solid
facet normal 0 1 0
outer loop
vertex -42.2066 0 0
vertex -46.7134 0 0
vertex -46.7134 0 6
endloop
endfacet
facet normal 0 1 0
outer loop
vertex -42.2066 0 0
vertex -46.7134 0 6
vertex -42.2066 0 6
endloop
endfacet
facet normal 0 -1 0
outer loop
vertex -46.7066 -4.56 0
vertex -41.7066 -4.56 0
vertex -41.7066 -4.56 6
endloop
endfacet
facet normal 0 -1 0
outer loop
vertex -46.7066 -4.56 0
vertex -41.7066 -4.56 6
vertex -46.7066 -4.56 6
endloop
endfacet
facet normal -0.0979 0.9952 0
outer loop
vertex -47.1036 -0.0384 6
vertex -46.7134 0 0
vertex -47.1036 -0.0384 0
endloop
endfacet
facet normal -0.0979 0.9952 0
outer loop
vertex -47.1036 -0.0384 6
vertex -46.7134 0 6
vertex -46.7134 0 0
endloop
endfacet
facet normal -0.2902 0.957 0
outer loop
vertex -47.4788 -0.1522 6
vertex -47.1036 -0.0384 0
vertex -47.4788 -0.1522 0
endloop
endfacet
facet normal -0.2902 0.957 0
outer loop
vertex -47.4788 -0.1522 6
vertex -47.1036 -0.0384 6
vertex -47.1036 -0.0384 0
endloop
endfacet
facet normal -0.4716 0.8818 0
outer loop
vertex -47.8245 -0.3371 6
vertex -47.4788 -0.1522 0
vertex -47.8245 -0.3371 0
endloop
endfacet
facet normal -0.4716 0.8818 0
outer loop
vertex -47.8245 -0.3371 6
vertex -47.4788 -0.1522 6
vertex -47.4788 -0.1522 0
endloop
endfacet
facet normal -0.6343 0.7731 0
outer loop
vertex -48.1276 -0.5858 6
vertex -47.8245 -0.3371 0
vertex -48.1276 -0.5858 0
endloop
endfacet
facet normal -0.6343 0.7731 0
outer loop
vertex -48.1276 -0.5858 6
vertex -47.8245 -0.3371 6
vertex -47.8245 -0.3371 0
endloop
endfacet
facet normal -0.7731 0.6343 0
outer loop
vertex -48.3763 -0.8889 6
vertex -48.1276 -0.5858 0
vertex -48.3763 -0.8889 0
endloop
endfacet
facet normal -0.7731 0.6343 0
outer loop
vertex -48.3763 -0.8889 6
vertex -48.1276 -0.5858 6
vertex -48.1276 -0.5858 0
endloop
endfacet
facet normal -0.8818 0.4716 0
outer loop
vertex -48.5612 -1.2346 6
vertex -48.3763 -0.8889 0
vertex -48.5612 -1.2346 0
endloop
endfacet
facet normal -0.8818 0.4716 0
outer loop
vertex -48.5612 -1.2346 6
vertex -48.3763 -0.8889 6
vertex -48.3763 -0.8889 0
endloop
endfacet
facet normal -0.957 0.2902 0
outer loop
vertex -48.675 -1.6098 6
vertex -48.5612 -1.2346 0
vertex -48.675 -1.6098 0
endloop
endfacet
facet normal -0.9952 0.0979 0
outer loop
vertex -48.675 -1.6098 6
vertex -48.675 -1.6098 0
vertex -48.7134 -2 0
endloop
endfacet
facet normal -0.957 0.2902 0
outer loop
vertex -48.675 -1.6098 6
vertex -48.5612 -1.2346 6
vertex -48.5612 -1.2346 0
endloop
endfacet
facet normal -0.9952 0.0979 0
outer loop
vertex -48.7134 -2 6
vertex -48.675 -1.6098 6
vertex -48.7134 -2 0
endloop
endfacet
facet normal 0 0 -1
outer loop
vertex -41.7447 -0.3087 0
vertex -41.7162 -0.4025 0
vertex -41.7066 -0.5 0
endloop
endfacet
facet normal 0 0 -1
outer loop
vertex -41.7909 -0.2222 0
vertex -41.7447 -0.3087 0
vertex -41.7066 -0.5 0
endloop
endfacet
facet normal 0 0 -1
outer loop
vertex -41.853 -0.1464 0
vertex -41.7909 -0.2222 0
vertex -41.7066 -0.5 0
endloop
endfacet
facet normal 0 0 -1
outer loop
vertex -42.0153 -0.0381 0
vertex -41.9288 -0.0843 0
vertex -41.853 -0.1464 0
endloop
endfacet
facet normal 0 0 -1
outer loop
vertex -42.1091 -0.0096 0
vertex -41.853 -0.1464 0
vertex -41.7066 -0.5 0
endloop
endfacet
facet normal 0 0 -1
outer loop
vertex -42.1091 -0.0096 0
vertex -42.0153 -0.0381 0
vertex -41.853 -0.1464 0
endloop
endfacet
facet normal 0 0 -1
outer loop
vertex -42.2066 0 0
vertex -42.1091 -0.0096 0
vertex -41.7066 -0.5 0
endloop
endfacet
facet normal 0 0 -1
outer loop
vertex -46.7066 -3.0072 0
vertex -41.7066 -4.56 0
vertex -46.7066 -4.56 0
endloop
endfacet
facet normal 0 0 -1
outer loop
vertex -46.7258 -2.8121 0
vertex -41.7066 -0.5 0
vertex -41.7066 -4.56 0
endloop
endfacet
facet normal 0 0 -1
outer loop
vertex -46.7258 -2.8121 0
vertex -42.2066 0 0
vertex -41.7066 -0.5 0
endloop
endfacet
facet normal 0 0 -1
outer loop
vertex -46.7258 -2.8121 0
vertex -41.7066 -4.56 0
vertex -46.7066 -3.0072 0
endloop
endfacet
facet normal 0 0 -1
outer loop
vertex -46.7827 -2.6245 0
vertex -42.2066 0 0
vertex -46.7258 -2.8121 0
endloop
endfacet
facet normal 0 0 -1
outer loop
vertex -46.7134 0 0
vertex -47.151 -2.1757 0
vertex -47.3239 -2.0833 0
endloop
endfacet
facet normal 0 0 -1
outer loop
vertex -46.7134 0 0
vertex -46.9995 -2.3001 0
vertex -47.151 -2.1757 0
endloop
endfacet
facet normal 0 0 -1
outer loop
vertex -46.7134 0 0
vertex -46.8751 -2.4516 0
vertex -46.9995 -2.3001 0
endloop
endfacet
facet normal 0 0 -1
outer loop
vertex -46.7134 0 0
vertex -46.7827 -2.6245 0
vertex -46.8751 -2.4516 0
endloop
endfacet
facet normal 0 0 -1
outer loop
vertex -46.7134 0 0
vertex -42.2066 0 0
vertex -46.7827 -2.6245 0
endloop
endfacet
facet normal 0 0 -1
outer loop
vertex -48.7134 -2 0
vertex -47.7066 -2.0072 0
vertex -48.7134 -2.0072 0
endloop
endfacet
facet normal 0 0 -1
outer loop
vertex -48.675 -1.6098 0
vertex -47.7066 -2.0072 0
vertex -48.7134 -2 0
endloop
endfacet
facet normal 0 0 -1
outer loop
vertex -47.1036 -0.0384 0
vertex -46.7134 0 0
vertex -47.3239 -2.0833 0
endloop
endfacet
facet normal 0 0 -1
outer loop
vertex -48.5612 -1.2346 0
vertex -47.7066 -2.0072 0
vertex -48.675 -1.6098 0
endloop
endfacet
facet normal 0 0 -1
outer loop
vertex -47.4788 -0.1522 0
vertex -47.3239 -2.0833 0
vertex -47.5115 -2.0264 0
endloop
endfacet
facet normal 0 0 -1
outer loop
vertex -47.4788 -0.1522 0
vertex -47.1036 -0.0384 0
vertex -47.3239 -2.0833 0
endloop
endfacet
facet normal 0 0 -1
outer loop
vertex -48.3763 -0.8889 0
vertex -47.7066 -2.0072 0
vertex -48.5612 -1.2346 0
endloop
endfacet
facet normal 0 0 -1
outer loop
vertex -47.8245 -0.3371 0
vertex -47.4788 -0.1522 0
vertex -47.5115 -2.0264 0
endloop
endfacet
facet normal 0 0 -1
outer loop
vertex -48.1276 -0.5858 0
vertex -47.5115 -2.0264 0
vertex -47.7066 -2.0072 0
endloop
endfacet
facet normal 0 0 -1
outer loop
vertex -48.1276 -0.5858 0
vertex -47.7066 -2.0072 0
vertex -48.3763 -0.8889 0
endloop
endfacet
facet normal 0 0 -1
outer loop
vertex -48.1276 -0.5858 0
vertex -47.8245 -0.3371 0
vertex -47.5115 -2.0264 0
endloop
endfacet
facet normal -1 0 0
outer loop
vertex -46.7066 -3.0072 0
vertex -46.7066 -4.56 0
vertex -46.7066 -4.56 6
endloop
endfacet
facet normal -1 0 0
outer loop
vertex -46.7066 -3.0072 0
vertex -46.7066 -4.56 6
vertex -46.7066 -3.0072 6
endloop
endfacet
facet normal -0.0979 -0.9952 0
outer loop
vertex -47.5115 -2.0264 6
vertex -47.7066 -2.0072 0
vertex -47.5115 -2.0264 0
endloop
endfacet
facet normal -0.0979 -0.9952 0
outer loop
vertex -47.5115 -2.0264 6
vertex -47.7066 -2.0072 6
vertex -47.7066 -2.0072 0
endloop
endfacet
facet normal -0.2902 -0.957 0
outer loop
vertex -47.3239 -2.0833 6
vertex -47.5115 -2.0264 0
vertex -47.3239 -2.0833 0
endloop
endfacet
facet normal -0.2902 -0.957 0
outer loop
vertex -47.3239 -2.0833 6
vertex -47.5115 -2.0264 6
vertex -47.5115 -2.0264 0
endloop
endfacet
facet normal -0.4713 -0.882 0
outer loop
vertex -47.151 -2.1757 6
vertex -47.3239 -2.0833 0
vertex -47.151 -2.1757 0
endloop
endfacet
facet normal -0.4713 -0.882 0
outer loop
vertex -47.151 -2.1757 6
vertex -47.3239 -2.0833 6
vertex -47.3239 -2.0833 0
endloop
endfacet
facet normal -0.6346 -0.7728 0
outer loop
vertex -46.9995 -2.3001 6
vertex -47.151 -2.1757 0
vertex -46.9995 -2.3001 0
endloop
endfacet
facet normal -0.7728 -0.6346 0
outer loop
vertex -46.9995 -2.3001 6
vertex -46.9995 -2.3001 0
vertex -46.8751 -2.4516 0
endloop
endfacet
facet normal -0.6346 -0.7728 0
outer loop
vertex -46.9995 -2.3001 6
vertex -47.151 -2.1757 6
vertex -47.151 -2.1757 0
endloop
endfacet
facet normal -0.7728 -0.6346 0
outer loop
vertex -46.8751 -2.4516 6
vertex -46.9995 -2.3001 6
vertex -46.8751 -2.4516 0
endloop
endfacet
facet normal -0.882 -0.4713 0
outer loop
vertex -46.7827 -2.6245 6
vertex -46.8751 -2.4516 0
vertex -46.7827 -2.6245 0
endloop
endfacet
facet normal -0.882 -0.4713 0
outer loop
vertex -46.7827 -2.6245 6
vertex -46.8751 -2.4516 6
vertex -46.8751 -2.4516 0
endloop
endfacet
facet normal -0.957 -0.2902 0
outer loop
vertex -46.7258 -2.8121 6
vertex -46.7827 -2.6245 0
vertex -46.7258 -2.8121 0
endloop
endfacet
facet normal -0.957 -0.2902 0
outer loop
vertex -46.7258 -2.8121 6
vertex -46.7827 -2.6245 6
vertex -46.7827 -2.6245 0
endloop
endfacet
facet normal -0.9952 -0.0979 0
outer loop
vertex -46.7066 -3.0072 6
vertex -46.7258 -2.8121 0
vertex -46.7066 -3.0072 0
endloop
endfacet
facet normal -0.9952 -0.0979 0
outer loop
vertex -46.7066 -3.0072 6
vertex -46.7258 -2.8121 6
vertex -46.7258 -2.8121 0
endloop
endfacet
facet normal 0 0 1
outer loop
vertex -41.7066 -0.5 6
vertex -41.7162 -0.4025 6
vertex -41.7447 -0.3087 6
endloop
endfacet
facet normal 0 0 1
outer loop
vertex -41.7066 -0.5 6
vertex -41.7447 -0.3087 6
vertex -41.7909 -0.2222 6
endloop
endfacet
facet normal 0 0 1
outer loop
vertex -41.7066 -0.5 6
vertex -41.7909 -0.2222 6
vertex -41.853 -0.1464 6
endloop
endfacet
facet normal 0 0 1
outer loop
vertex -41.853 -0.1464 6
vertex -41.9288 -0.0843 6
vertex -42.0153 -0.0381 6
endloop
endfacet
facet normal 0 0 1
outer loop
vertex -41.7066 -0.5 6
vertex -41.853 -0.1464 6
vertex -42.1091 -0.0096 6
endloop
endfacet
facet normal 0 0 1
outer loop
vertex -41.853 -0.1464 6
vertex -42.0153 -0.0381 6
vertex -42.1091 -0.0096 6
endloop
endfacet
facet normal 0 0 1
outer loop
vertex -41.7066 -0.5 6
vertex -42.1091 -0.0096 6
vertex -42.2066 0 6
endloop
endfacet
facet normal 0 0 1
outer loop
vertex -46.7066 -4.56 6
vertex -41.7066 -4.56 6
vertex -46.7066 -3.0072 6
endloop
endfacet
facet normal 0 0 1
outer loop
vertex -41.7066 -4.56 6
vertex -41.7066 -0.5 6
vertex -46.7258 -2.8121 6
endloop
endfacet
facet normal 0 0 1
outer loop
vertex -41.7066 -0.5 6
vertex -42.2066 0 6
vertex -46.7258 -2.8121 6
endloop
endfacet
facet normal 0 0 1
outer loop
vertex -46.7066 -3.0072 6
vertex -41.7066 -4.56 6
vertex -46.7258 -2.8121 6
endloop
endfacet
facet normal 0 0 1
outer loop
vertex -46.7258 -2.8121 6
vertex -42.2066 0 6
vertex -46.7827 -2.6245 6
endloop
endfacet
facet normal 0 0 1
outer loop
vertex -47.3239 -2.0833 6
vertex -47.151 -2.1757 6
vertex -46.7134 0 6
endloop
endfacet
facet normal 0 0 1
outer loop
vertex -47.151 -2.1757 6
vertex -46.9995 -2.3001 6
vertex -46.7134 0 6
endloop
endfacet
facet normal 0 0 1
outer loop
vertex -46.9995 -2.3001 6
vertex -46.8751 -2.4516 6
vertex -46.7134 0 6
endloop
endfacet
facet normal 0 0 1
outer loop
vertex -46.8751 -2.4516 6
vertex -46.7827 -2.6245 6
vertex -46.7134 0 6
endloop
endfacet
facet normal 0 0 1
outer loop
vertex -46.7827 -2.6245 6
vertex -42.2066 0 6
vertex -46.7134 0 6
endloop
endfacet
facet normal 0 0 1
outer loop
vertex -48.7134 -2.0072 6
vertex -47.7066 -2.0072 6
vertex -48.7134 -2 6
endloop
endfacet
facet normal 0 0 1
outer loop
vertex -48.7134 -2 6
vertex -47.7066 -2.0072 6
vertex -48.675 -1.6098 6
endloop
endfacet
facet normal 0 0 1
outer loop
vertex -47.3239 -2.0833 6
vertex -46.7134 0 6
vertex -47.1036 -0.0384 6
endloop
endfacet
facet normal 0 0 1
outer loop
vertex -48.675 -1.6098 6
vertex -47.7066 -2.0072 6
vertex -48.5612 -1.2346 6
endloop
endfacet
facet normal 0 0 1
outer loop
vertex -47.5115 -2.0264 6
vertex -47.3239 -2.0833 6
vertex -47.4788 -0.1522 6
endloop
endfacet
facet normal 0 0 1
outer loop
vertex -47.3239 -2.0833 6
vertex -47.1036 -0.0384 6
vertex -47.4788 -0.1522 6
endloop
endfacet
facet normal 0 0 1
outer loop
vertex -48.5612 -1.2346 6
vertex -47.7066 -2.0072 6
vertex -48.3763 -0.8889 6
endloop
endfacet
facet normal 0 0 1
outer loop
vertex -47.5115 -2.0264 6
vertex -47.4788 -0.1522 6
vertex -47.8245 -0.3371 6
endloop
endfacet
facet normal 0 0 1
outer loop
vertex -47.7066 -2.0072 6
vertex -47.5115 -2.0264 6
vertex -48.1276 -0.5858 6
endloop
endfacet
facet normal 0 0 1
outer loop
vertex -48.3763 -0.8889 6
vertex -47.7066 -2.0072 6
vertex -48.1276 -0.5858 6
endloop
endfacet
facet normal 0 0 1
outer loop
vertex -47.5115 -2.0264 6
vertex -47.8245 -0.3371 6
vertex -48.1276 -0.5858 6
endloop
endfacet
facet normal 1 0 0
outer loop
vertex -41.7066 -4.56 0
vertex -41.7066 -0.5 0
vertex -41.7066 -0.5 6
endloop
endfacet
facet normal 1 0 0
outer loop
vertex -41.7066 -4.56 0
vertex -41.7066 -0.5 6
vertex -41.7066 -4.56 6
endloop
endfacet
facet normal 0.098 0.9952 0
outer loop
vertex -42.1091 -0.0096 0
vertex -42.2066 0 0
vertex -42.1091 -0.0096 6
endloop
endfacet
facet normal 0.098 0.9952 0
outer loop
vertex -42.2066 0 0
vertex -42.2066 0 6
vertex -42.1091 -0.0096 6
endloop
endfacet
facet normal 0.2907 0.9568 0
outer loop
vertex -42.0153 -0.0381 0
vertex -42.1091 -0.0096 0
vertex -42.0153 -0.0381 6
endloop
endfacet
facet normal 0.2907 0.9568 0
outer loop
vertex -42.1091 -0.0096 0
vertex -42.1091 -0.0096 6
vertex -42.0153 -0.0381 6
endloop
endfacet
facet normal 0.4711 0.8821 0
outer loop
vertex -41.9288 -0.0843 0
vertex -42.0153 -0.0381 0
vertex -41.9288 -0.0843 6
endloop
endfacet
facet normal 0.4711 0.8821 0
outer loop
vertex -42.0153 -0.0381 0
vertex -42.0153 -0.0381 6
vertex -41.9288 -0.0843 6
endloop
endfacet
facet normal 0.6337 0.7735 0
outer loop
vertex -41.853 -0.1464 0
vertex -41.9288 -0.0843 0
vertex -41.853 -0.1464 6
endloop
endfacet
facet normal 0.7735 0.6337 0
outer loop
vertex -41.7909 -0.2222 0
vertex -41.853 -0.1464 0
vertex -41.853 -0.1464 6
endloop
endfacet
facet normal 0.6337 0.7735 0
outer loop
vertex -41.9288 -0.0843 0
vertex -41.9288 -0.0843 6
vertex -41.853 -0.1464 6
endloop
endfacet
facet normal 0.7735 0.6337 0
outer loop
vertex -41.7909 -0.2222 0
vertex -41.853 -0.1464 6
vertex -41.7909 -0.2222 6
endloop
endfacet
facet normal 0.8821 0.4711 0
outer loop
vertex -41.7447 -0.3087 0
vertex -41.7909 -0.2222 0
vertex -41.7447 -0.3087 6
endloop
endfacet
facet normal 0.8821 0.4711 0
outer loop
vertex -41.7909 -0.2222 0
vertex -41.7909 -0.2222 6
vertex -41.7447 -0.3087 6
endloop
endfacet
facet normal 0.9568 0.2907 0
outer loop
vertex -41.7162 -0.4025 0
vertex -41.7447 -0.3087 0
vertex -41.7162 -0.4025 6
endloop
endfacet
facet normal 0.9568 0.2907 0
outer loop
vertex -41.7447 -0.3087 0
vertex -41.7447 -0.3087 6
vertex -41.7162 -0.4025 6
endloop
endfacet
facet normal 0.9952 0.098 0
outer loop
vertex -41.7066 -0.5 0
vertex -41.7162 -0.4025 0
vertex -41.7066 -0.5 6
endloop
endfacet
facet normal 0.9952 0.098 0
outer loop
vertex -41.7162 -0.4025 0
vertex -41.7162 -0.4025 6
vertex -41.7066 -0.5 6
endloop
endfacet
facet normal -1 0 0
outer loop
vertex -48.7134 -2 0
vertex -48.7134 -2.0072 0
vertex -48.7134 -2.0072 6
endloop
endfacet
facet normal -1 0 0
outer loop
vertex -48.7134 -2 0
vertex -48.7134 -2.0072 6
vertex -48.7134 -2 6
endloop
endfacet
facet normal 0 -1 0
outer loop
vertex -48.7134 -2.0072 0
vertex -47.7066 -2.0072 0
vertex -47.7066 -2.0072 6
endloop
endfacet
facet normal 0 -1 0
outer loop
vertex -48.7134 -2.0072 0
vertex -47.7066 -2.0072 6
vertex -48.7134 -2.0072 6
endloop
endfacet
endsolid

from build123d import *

# Parameters (mm, degrees)
EXTRUDE_1_DEPTH = 6
FILLET_1_R      = 0.5
FILLET_2_R      = 2
FILLET_3_R      = 1


with BuildPart() as part:
    # 草圖1 → 填料-伸長1 (new body)
    with BuildSketch(Plane.XY):
        Polygon((-48.713400366, 0), (-41.70660185, 0), (-41.70660185, -4.56), (-46.70660185, -4.56), (-46.70660185, -2.007214056), (-48.713400366, -2.007214056), align=None)
    extrude(amount=EXTRUDE_1_DEPTH)

    # 圓角1
    fillet_1_edges = [part.edges().sort_by_distance(p)[0] for p in [
        (-41.70660185, 0, 3),
    ]]
    fillet(fillet_1_edges, radius=FILLET_1_R)

    # 圓角2
    fillet_2_edges = [part.edges().sort_by_distance(p)[0] for p in [
        (-48.713400366, 0, 3),
    ]]
    fillet(fillet_2_edges, radius=FILLET_2_R)

    # 圓角3
    fillet_3_edges = [part.edges().sort_by_distance(p)[0] for p in [
        (-46.70660185, -2.007214056, 3),
    ]]
    fillet(fillet_3_edges, radius=FILLET_3_R)


solid = part.part
